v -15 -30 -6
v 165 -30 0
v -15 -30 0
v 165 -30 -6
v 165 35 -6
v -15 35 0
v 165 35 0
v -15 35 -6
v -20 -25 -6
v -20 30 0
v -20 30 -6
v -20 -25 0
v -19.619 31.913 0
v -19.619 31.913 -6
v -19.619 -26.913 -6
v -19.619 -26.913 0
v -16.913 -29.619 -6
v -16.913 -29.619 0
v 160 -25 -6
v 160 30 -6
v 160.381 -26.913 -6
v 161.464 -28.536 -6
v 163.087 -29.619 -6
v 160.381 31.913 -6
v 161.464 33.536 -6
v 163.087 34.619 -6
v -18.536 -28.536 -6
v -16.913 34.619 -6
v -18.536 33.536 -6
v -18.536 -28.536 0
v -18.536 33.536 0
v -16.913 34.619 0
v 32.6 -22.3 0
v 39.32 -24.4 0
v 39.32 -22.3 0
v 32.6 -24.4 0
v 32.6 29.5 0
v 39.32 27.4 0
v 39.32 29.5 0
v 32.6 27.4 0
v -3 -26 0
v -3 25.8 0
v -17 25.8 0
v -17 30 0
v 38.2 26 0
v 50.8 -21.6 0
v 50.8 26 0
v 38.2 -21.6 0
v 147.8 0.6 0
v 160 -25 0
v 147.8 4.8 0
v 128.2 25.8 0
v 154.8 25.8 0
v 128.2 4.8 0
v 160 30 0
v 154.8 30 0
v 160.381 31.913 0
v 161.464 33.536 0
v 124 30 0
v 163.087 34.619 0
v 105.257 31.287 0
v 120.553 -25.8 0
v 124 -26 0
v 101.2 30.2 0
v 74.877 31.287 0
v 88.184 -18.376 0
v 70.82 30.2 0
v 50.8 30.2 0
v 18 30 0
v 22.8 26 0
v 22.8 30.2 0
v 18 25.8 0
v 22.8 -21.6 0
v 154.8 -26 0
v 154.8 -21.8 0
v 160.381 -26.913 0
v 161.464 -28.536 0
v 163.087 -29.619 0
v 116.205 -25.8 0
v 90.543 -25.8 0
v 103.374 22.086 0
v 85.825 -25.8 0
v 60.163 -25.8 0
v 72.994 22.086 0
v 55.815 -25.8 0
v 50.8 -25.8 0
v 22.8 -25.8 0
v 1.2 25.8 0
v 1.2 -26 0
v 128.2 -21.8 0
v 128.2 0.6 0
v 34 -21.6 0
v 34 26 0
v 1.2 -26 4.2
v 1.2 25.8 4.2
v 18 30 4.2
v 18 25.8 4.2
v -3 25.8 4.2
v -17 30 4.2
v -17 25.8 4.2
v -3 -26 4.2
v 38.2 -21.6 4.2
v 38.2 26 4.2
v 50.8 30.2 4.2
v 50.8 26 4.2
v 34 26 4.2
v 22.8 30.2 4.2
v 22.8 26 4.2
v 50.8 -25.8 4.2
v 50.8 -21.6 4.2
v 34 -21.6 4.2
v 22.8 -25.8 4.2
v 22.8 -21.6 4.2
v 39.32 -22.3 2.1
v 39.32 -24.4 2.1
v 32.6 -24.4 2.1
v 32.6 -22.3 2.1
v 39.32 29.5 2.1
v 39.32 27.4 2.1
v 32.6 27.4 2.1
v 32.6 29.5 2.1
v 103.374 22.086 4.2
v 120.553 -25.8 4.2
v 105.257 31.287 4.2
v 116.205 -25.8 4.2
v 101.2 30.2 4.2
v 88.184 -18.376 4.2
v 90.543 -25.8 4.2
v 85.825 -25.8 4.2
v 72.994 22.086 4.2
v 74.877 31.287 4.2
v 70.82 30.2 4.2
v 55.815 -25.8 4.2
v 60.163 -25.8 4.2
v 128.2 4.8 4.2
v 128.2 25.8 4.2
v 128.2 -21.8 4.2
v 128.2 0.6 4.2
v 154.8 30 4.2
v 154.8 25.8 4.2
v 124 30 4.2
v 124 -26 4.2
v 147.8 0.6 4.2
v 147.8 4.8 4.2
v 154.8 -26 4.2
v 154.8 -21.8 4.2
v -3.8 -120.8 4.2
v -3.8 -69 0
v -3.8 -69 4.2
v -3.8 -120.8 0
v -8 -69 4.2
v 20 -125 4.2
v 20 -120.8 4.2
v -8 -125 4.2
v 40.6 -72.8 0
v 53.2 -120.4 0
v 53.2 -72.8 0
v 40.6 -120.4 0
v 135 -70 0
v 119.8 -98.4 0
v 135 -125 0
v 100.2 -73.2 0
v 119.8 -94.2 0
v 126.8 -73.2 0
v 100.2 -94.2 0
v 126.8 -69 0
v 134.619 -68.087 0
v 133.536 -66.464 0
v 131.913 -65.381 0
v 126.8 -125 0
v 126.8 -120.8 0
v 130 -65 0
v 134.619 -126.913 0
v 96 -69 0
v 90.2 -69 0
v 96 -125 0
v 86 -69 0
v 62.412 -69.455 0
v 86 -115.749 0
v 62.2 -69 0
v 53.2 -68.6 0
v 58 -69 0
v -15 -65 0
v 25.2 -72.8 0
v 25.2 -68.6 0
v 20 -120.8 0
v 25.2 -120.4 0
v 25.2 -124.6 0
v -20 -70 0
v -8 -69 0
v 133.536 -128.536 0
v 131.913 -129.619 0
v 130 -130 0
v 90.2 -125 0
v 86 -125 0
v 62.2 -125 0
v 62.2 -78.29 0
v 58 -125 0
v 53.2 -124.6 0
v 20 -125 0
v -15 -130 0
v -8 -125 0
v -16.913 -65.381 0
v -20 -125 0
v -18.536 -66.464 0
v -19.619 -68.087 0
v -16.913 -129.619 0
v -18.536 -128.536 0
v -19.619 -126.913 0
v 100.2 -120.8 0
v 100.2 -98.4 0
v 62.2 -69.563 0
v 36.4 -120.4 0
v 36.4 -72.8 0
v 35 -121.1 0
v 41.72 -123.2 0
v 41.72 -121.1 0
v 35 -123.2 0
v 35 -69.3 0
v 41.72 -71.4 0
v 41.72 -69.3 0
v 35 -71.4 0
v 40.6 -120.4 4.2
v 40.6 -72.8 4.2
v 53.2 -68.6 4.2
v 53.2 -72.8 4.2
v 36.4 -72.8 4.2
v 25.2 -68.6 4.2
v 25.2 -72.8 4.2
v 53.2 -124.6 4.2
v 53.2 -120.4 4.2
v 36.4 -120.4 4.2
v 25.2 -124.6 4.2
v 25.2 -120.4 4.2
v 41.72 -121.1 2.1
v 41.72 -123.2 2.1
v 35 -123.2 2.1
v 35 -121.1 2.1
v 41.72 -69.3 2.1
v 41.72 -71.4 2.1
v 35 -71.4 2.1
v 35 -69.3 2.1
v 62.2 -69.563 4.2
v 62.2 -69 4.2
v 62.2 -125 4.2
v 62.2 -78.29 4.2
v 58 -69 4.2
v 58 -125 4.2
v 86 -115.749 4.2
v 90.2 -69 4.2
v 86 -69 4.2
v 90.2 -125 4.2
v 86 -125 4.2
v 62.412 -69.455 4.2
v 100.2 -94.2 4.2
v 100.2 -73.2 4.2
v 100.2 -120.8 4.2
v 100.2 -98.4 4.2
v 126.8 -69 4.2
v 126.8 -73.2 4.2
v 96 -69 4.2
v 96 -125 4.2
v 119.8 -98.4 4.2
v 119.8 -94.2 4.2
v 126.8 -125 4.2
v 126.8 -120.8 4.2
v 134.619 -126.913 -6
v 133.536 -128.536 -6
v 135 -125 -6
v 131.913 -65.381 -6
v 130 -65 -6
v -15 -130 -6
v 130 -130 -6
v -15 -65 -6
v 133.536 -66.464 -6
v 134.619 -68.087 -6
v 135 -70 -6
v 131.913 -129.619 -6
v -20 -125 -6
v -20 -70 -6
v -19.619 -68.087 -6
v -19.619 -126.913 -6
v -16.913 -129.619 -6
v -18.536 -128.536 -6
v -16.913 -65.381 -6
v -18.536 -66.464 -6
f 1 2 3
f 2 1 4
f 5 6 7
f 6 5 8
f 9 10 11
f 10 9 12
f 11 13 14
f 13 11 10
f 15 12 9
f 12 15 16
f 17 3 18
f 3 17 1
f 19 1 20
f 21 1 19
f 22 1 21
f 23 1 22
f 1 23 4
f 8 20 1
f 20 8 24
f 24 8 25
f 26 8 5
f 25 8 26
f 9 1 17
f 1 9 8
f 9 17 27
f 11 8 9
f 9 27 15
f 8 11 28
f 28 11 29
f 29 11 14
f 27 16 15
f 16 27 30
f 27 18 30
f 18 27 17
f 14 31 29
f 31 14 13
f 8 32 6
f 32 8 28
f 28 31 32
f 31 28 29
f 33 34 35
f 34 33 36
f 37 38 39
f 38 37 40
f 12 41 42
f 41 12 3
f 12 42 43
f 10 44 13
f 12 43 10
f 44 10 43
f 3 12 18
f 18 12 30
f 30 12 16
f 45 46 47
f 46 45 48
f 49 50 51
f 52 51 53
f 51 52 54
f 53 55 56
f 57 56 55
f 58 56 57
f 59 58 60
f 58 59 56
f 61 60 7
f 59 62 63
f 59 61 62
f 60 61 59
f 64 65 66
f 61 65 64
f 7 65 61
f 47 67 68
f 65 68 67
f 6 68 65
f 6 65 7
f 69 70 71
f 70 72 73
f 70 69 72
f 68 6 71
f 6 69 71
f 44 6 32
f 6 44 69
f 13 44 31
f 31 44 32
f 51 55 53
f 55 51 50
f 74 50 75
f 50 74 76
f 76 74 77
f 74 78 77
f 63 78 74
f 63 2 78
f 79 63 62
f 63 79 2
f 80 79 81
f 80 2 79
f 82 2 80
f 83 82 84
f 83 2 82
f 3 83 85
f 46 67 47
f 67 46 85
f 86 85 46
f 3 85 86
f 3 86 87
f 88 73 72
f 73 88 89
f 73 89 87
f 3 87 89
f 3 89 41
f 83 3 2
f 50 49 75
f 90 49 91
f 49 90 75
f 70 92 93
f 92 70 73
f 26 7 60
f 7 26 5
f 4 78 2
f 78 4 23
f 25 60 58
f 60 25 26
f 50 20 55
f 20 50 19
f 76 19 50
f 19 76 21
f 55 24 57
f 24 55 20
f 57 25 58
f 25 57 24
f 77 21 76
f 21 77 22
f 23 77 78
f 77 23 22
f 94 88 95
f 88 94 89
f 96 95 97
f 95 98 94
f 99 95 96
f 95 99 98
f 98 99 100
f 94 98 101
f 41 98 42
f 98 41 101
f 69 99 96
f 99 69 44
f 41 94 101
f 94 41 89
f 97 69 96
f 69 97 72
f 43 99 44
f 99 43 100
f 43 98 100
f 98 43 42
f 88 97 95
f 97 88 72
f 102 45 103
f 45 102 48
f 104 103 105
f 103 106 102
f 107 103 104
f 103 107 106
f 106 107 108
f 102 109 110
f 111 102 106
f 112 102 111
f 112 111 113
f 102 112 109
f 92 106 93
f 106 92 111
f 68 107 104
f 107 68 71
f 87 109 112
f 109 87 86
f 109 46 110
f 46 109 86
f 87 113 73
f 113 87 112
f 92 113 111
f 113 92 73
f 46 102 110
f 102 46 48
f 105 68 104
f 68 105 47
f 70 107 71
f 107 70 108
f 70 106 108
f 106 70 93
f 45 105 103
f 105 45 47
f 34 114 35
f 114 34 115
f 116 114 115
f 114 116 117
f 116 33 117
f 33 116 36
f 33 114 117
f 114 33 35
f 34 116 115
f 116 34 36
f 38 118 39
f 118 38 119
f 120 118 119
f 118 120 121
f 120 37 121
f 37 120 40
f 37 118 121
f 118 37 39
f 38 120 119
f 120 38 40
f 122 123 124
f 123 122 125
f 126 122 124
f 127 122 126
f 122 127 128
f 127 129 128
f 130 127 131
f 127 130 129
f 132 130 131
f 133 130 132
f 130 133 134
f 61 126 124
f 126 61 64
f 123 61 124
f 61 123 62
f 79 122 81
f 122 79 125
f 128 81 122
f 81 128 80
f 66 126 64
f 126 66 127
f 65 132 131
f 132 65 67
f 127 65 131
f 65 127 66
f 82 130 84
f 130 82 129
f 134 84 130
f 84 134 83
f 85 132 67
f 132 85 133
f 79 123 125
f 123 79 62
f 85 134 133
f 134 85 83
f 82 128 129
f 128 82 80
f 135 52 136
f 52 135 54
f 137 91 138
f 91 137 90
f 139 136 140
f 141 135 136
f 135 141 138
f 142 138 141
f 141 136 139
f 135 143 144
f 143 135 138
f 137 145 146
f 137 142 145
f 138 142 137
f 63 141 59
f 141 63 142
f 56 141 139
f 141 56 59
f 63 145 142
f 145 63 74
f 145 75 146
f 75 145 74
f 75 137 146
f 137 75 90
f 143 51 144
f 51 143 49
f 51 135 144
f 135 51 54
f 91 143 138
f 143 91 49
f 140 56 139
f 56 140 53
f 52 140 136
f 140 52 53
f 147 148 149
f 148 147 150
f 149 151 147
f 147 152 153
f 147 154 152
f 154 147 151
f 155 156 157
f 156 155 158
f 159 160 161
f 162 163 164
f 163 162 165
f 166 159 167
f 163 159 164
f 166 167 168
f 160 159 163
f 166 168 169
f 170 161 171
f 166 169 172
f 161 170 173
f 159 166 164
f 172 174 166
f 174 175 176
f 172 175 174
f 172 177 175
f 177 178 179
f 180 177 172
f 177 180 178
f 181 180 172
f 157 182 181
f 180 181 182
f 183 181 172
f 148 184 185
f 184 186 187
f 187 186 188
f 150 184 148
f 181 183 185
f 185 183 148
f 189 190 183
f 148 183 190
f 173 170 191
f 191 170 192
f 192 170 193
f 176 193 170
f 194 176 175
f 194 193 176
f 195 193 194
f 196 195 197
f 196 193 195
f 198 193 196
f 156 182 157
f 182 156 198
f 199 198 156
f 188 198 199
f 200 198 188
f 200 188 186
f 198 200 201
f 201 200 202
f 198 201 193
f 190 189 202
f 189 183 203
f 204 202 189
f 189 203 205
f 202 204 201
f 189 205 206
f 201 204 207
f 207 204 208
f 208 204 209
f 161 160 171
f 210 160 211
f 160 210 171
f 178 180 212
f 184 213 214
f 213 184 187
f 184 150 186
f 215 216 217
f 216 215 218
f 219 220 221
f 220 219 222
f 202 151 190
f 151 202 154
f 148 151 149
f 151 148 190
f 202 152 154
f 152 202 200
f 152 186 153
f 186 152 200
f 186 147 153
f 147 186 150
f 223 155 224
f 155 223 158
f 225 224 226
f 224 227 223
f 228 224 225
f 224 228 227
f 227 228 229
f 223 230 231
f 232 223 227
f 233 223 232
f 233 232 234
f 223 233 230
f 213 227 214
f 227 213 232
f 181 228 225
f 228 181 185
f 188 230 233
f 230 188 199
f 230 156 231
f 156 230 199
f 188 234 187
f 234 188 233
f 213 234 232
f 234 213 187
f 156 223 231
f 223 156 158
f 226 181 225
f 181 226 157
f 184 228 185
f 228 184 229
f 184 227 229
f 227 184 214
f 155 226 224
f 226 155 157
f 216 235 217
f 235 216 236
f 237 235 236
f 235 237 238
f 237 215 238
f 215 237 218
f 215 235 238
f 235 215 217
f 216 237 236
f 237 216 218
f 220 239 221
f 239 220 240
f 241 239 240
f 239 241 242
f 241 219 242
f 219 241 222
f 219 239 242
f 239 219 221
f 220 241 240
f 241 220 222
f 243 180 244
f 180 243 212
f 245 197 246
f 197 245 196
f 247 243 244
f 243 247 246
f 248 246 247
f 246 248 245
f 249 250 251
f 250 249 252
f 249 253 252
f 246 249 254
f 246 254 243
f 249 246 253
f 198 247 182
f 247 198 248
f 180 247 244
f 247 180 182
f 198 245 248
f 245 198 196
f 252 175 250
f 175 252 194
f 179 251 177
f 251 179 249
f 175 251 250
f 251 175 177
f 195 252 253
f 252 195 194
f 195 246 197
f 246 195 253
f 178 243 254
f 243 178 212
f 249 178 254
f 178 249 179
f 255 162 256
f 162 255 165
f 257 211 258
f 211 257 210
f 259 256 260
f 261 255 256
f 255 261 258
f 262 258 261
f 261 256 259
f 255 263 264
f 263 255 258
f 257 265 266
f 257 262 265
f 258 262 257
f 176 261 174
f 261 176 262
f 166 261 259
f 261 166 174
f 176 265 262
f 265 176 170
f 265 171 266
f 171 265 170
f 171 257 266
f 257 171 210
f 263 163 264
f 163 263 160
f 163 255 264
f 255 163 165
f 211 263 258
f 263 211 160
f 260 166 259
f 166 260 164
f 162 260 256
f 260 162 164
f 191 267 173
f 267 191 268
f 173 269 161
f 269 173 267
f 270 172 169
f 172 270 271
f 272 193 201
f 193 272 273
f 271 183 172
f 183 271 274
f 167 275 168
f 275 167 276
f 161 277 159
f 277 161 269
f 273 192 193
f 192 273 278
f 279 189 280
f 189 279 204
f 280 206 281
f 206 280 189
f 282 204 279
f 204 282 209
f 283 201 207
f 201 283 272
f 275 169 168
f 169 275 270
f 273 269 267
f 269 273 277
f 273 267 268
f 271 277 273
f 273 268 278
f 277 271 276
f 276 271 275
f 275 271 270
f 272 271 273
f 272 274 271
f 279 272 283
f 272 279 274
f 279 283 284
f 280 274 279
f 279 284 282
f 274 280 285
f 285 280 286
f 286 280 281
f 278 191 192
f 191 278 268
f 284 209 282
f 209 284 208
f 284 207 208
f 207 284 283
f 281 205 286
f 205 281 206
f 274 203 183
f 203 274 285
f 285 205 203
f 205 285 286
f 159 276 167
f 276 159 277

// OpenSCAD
//Основа 1
 difference(){
	translate([-15,-25,-6]){
 minkowski(){
	cube([180,55,3]); cylinder(3,5,5);
}
}
	translate([165,-25,-8]){
 minkowski(){ 
	cube([180,55,6]); cylinder(3,5,5);
}
}
}

 color([0,0,0]){
//Time

	translate([20,5,0])
 union(){
//T
	translate([-23,-31,0])
	 scale(1.4){  
 union(){ 
  	cube([3,40,3]);
   	translate([-10,37,0]) cube([25,3,3]);
}
}


//I
 	scale(1.4){
	translate([10,-22,0])
 difference(){
 union(){ 
 	cube([3,40,3]);
 	translate([-8,0,0]) cube([20,3,3]);
  	translate([-8,37,0]) cube([20,3,3]);
}
	translate([-1,1,0]) cube([4.8,1.5,1.5]);
	translate([-1,38,0]) cube([4.8,1.5,1.5]);
}
}

//M
	scale(1.4){ 
	translate([74,18,0]) rotate([0,0,-90])
 difference(){
 union(){
 	translate([0,-16,0]) rotate([0,0,15]) cube([43,3,3]);
  	translate([0,-16,0]) rotate([0,0,-15]) cube([43,3,3]);
	translate([0,-37.7,0]) rotate([0,0,15]) cube([43,3,3]);
	translate([0,-37.7,0]) rotate([0,0,-15]) cube([43,3,3]);
}
 	translate([40,-60,0]) cube([5,60,6]);
}
}
//E
translate([104,-31,0])
 scale(1.4){
   union(){ 
    cube([3,40,3]);
    cube([22,3,3]);
     translate([0,19,0]) cube([17,3,3]);
     translate([0,37,0]) cube([22,3,3]);
}
}
}
}


//Основа 2
	translate([-15,-125,-6]){
 minkowski(){
	cube([145,55,3]); cylinder(3,5,5);
}
}


//Line
	color([0,0,0]){
//L
	translate([-8,-125,0])
	 scale(1.4){
 union(){ 
 	cube([3,40,3]);
 	cube([20,3,3]);
}
}

//I
	 scale(1.4){
	translate([26,-89,0])
 difference(){
 union(){ 
 	cube([3,40,3]);
  	translate([-8,0,0]) cube([20,3,3]);
  	translate([-8,37,0]) cube([20,3,3]);
}
	translate([-1,1,0]) cube([4.8,1.5,1.5]);
	translate([-1,38,0]) cube([4.8,1.5,1.5]);
}
}

//N
	translate([58,-125,0])
	scale(1.4){
 union(){
 	cube([3,40,3]);
 	translate([20,0,0,]) cube([3,40,3]);
 	translate([20,0,0]) rotate([0,0,27]) cube([3,43,3]);
}
}

//E
	translate([96,-125,0])
 	scale(1.4){
 union(){ 
    	cube([3,40,3]);
    	cube([22,3,3]);
    translate([0,19,0]) cube([17,3,3]);
    translate([0,37,0]) cube([22,3,3]);
}
}
}
